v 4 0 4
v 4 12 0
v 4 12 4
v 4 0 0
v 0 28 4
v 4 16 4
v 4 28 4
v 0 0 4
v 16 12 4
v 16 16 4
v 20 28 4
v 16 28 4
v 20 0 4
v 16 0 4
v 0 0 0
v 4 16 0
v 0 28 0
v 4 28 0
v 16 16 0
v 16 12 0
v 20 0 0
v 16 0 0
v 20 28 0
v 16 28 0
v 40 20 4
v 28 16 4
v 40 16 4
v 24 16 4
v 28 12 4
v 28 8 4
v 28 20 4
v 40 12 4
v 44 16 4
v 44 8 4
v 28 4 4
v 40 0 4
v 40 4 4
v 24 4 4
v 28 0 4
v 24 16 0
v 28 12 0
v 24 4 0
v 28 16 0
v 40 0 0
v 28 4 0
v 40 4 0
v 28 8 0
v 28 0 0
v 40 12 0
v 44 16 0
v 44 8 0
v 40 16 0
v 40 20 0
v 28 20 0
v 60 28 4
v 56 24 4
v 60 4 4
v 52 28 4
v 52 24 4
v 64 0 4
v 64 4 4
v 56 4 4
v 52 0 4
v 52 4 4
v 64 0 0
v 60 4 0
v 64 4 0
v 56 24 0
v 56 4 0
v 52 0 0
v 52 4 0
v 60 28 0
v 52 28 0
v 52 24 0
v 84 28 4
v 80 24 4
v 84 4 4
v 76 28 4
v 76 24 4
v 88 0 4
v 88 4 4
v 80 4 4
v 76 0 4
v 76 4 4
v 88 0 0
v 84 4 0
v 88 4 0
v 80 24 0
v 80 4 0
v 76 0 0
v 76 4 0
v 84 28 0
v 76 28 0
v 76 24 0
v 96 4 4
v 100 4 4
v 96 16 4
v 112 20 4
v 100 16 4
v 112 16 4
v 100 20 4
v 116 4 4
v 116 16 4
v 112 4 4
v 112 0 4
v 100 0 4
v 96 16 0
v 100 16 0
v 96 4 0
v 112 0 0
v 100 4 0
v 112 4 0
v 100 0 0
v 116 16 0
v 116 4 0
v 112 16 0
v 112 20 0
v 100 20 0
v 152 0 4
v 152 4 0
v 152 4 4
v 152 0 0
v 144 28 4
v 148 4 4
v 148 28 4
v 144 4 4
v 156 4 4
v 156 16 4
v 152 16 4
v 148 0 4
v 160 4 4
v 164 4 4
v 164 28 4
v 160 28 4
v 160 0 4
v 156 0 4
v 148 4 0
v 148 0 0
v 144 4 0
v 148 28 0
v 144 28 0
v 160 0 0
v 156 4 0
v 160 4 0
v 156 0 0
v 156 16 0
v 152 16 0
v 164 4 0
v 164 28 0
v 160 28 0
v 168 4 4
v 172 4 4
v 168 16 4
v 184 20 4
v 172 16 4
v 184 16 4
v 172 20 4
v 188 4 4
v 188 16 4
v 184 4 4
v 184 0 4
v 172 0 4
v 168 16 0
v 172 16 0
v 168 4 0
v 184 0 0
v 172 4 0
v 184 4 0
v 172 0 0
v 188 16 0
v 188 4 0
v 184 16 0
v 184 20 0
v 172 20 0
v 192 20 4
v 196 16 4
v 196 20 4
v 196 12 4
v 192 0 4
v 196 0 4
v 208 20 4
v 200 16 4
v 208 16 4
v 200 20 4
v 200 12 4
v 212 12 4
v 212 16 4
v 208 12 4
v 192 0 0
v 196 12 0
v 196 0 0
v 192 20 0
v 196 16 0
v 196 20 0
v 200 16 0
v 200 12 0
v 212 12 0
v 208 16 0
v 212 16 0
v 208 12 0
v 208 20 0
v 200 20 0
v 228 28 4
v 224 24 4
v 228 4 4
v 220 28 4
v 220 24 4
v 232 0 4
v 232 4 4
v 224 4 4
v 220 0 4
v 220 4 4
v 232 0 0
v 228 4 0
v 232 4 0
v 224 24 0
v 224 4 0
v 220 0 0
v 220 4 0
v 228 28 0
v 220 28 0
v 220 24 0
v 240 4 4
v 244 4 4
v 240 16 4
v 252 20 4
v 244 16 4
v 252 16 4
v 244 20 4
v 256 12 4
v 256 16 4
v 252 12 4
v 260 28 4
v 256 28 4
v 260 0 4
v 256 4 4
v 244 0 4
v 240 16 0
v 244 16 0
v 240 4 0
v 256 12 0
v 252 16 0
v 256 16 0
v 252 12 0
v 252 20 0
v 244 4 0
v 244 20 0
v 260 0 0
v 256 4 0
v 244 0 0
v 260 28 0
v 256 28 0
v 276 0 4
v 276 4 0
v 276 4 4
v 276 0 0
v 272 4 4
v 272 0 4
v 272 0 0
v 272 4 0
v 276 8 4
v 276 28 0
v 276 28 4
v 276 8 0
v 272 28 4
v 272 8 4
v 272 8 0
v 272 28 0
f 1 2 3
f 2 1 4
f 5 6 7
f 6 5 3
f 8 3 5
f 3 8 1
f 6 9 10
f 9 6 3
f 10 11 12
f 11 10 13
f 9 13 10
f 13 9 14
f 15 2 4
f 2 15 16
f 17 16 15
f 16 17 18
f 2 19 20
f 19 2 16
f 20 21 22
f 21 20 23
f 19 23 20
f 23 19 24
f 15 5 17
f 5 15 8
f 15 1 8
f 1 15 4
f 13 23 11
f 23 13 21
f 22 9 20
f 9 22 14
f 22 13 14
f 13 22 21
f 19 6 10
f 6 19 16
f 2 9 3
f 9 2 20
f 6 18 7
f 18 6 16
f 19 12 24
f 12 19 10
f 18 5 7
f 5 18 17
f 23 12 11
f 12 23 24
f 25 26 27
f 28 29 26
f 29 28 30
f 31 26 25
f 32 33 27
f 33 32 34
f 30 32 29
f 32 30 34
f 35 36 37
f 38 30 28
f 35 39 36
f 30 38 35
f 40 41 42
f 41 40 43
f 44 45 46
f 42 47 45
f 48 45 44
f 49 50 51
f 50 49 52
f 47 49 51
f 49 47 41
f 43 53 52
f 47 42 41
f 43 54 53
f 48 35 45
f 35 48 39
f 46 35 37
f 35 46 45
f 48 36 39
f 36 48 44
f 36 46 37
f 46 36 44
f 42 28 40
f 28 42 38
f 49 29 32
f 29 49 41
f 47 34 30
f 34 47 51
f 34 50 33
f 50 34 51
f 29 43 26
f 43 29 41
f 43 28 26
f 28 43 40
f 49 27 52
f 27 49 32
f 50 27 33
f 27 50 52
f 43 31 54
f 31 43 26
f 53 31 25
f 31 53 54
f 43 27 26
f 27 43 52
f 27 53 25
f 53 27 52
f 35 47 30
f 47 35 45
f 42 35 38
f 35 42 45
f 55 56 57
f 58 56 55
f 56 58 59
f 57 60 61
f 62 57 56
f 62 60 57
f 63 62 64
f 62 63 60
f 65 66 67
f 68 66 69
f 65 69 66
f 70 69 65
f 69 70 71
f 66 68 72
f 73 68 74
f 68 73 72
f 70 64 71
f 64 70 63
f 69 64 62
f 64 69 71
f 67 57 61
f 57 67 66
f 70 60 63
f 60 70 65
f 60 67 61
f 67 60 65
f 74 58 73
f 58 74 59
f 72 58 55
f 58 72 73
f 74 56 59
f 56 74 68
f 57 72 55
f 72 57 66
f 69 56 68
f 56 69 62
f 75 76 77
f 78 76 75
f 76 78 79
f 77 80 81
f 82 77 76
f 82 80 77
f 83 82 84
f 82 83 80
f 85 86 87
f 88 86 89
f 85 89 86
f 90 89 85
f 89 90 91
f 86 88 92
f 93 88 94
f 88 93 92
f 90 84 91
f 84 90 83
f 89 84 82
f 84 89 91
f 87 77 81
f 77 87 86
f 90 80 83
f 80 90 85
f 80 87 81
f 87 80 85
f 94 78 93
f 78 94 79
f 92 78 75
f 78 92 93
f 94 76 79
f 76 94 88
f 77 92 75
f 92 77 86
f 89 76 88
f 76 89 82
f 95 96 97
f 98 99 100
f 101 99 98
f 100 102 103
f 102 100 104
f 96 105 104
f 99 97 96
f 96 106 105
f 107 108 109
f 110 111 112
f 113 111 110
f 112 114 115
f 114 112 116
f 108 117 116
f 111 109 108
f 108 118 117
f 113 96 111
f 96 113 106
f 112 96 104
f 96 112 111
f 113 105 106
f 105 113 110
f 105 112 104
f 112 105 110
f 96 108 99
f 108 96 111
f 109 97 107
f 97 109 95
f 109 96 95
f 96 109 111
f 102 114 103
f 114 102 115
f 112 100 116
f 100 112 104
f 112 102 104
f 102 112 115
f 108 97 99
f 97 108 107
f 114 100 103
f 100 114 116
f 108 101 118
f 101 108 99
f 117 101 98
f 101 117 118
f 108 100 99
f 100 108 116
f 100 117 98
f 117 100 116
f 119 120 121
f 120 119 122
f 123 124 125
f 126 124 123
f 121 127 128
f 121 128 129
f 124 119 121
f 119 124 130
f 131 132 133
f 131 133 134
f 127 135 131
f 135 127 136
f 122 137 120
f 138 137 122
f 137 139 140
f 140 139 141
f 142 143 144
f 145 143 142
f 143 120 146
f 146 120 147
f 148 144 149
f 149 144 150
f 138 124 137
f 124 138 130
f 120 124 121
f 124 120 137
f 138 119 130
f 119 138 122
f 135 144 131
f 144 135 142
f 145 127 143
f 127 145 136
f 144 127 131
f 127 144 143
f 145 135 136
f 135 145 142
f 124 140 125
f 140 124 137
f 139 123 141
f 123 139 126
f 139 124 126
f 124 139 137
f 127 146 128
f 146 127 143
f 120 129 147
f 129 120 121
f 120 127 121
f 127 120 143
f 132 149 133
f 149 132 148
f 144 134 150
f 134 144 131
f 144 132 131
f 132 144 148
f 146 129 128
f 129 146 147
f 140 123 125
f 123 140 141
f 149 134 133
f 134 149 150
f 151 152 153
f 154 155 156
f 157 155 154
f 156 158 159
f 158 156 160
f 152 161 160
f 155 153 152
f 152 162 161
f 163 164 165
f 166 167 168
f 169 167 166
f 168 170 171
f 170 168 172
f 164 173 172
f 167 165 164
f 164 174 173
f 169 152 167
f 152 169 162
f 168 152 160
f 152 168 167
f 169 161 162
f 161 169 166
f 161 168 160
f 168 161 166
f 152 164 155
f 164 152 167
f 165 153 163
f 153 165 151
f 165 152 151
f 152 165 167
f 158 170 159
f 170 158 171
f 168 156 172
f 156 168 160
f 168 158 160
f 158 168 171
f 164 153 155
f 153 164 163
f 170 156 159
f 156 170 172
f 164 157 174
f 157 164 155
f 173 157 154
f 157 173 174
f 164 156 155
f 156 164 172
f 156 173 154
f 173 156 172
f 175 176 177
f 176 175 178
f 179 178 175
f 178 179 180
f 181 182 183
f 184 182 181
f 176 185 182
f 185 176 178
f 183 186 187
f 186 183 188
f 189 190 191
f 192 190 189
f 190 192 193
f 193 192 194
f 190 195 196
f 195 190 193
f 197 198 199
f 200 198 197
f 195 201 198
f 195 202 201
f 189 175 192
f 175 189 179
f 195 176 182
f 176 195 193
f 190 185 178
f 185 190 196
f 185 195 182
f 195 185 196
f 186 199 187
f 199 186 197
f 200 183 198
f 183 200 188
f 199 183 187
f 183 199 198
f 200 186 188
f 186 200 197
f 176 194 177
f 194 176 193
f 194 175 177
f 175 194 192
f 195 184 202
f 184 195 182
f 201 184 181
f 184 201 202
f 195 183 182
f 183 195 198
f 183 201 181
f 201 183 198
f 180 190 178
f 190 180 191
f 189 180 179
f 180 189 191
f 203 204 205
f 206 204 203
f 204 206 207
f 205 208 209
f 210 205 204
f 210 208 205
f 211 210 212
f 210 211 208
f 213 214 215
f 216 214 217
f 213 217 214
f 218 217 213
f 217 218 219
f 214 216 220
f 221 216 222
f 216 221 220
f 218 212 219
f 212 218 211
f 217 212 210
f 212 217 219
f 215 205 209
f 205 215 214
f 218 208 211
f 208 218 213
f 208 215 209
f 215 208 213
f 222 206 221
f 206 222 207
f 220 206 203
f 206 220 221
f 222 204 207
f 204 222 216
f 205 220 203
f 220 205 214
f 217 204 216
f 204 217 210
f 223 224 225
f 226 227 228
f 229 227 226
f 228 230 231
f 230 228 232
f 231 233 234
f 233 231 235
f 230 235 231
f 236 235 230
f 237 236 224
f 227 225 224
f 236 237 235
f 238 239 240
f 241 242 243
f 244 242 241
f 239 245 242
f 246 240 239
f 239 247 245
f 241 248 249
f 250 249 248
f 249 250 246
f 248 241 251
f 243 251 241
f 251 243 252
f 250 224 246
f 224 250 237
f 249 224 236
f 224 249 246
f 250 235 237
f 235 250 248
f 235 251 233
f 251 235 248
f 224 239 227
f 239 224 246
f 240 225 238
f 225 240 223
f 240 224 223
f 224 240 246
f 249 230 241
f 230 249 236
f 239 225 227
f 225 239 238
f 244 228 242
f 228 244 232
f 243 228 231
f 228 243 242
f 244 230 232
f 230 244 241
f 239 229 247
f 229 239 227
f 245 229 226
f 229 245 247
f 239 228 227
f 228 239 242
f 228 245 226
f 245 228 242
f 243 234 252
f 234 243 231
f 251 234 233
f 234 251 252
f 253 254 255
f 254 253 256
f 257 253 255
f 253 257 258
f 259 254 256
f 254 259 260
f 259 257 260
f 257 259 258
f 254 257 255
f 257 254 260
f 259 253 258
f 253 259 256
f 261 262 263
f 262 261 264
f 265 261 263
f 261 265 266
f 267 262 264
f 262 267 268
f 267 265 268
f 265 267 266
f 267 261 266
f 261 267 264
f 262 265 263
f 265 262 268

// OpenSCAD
//Draw text
scale([4,4,4]) drawtext("Hello World!");

//Draw character set
//scale([2,2,2]) drawtext(" !\"#$%&'()*+,-./0123456789:;<=>?@ABCDEFGHIJKLMNOPQRSTUVWXYZ[\\]^_`abcdefghijklmnopqrstuvwxyz{|}");

module drawtext(text) {
	//Characters
	chars = " !\"#$%&'()*+,-./0123456789:;<=>?@ABCDEFGHIJKLMNOPQRSTUVWXYZ[\\]^_`abcdefghijklmnopqrstuvwxyz{|}";

	//Chracter table defining 5x7 characters
	//Adapted from: http://www.geocities.com/dinceraydin/djlcdsim/chartable.js
	char_table = [ [ 0, 0, 0, 0, 0, 0, 0],
                  [ 4, 0, 4, 4, 4, 4, 4],
                  [ 0, 0, 0, 0,10,10,10],
                  [10,10,31,10,31,10,10],
                  [ 4,30, 5,14,20,15, 4],
                  [ 3,19, 8, 4, 2,25,24],
                  [13,18,21, 8,20,18,12],
                  [ 0, 0, 0, 0, 8, 4,12],
                  [ 2, 4, 8, 8, 8, 4, 2],
                  [ 8, 4, 2, 2, 2, 4, 8],
                  [ 0, 4,21,14,21, 4, 0],
                  [ 0, 4, 4,31, 4, 4, 0],
                  [ 8, 4,12, 0, 0, 0, 0],
                  [ 0, 0, 0,31, 0, 0, 0],
                  [12,12, 0, 0, 0, 0, 0],
                  [ 0,16, 8, 4, 2, 1, 0],
                  [14,17,25,21,19,17,14],
                  [14, 4, 4, 4, 4,12, 4],
                  [31, 8, 4, 2, 1,17,14],
                  [14,17, 1, 2, 4, 2,31],
                  [ 2, 2,31,18,10, 6, 2],
                  [14,17, 1, 1,30,16,31],
                  [14,17,17,30,16, 8, 6],
                  [ 8, 8, 8, 4, 2, 1,31],
                  [14,17,17,14,17,17,14],
                  [12, 2, 1,15,17,17,14],
                  [ 0,12,12, 0,12,12, 0],
                  [ 8, 4,12, 0,12,12, 0],
                  [ 2, 4, 8,16, 8, 4, 2],
                  [ 0, 0,31, 0,31, 0, 0],
                  [16, 8, 4, 2, 4, 8,16],
                  [ 4, 0, 4, 2, 1,17,14],
                  [14,21,21,13, 1,17,14],
                  [17,17,31,17,17,17,14],
                  [30,17,17,30,17,17,30],
                  [14,17,16,16,16,17,14],
                  [30,17,17,17,17,17,30],
                  [31,16,16,30,16,16,31],
                  [16,16,16,30,16,16,31],
                  [15,17,17,23,16,17,14],
                  [17,17,17,31,17,17,17],
                  [14, 4, 4, 4, 4, 4,14],
                  [12,18, 2, 2, 2, 2, 7],
                  [17,18,20,24,20,18,17],
                  [31,16,16,16,16,16,16],
                  [17,17,17,21,21,27,17],
                  [17,17,19,21,25,17,17],
                  [14,17,17,17,17,17,14],
                  [16,16,16,30,17,17,30],
                  [13,18,21,17,17,17,14],
                  [17,18,20,30,17,17,30],
                  [30, 1, 1,14,16,16,15],
                  [ 4, 4, 4, 4, 4, 4,31],
                  [14,17,17,17,17,17,17],
                  [ 4,10,17,17,17,17,17],
                  [10,21,21,21,17,17,17],
                  [17,17,10, 4,10,17,17],
                  [ 4, 4, 4,10,17,17,17],
                  [31,16, 8, 4, 2, 1,31],
                  [14, 8, 8, 8, 8, 8,14],
                  [ 0, 1, 2, 4, 8,16, 0],
                  [14, 2, 2, 2, 2, 2,14],
                  [ 0, 0, 0, 0,17,10, 4],
                  [31, 0, 0, 0, 0, 0, 0],
                  [ 0, 0, 0, 0, 2, 4, 8],
                  [15,17,15, 1,14, 0, 0],
                  [30,17,17,25,22,16,16],
                  [14,17,16,16,14, 0, 0],
                  [15,17,17,19,13, 1, 1],
                  [14,16,31,17,14, 0, 0],
                  [ 8, 8, 8,28, 8, 9, 6],
                  [14, 1,15,17,15, 0, 0],
                  [17,17,17,25,22,16,16],
                  [14, 4, 4, 4,12, 0, 4],
                  [12,18, 2, 2, 2, 6, 2],
                  [18,20,24,20,18,16,16],
                  [14, 4, 4, 4, 4, 4,12],
                  [17,17,21,21,26, 0, 0],
                  [17,17,17,25,22, 0, 0],
                  [14,17,17,17,14, 0, 0],
                  [16,16,30,17,30, 0, 0],
                  [ 1, 1,15,19,13, 0, 0],
                  [16,16,16,25,22, 0, 0],
                  [30, 1,14,16,15, 0, 0],
                  [ 6, 9, 8, 8,28, 8, 8],
                  [13,19,17,17,17, 0, 0],
                  [ 4,10,17,17,17, 0, 0],
                  [10,21,21,17,17, 0, 0],
                  [17,10, 4,10,17, 0, 0],
                  [14, 1,15,17,17, 0, 0],
                  [31, 8, 4, 2,31, 0, 0],
                  [ 2, 4, 4, 8, 4, 4, 2],
                  [ 4, 4, 4, 4, 4, 4, 4],
                  [ 8, 4, 4, 2, 4, 4, 8] ];

	//Binary decode table
	dec_table = [ "00000", "00001", "00010", "00011", "00100", "00101",
  	            "00110", "00111", "01000", "01001", "01010", "01011",
  	            "01100", "01101", "01110", "01111", "10000", "10001",
  	            "10010", "10011", "10100", "10101", "10110", "10111",
	            "11000", "11001", "11010", "11011", "11100", "11101",
	            "11110", "11111" ];

	//Process string one character at a time
	for(itext = [0:len(text)-1]) {
		//Convert character to index
		assign(ichar = search(text[itext],chars,1)[0]) {
			//Decode character - rows
			for(irow = [0:6]) {
				assign(val = dec_table[char_table[ichar][irow]]) {
					//Decode character - cols
					for(icol = [0:4]) {
						assign(bit = search(val[icol],"01",1)[0]) {
							if(bit) {
								//Output cube
								translate([icol + (6*itext), irow, 0])
									cube([1.0001,1.0001,1]);
							}
						}
					}
				}
			}
		}
	}
}
